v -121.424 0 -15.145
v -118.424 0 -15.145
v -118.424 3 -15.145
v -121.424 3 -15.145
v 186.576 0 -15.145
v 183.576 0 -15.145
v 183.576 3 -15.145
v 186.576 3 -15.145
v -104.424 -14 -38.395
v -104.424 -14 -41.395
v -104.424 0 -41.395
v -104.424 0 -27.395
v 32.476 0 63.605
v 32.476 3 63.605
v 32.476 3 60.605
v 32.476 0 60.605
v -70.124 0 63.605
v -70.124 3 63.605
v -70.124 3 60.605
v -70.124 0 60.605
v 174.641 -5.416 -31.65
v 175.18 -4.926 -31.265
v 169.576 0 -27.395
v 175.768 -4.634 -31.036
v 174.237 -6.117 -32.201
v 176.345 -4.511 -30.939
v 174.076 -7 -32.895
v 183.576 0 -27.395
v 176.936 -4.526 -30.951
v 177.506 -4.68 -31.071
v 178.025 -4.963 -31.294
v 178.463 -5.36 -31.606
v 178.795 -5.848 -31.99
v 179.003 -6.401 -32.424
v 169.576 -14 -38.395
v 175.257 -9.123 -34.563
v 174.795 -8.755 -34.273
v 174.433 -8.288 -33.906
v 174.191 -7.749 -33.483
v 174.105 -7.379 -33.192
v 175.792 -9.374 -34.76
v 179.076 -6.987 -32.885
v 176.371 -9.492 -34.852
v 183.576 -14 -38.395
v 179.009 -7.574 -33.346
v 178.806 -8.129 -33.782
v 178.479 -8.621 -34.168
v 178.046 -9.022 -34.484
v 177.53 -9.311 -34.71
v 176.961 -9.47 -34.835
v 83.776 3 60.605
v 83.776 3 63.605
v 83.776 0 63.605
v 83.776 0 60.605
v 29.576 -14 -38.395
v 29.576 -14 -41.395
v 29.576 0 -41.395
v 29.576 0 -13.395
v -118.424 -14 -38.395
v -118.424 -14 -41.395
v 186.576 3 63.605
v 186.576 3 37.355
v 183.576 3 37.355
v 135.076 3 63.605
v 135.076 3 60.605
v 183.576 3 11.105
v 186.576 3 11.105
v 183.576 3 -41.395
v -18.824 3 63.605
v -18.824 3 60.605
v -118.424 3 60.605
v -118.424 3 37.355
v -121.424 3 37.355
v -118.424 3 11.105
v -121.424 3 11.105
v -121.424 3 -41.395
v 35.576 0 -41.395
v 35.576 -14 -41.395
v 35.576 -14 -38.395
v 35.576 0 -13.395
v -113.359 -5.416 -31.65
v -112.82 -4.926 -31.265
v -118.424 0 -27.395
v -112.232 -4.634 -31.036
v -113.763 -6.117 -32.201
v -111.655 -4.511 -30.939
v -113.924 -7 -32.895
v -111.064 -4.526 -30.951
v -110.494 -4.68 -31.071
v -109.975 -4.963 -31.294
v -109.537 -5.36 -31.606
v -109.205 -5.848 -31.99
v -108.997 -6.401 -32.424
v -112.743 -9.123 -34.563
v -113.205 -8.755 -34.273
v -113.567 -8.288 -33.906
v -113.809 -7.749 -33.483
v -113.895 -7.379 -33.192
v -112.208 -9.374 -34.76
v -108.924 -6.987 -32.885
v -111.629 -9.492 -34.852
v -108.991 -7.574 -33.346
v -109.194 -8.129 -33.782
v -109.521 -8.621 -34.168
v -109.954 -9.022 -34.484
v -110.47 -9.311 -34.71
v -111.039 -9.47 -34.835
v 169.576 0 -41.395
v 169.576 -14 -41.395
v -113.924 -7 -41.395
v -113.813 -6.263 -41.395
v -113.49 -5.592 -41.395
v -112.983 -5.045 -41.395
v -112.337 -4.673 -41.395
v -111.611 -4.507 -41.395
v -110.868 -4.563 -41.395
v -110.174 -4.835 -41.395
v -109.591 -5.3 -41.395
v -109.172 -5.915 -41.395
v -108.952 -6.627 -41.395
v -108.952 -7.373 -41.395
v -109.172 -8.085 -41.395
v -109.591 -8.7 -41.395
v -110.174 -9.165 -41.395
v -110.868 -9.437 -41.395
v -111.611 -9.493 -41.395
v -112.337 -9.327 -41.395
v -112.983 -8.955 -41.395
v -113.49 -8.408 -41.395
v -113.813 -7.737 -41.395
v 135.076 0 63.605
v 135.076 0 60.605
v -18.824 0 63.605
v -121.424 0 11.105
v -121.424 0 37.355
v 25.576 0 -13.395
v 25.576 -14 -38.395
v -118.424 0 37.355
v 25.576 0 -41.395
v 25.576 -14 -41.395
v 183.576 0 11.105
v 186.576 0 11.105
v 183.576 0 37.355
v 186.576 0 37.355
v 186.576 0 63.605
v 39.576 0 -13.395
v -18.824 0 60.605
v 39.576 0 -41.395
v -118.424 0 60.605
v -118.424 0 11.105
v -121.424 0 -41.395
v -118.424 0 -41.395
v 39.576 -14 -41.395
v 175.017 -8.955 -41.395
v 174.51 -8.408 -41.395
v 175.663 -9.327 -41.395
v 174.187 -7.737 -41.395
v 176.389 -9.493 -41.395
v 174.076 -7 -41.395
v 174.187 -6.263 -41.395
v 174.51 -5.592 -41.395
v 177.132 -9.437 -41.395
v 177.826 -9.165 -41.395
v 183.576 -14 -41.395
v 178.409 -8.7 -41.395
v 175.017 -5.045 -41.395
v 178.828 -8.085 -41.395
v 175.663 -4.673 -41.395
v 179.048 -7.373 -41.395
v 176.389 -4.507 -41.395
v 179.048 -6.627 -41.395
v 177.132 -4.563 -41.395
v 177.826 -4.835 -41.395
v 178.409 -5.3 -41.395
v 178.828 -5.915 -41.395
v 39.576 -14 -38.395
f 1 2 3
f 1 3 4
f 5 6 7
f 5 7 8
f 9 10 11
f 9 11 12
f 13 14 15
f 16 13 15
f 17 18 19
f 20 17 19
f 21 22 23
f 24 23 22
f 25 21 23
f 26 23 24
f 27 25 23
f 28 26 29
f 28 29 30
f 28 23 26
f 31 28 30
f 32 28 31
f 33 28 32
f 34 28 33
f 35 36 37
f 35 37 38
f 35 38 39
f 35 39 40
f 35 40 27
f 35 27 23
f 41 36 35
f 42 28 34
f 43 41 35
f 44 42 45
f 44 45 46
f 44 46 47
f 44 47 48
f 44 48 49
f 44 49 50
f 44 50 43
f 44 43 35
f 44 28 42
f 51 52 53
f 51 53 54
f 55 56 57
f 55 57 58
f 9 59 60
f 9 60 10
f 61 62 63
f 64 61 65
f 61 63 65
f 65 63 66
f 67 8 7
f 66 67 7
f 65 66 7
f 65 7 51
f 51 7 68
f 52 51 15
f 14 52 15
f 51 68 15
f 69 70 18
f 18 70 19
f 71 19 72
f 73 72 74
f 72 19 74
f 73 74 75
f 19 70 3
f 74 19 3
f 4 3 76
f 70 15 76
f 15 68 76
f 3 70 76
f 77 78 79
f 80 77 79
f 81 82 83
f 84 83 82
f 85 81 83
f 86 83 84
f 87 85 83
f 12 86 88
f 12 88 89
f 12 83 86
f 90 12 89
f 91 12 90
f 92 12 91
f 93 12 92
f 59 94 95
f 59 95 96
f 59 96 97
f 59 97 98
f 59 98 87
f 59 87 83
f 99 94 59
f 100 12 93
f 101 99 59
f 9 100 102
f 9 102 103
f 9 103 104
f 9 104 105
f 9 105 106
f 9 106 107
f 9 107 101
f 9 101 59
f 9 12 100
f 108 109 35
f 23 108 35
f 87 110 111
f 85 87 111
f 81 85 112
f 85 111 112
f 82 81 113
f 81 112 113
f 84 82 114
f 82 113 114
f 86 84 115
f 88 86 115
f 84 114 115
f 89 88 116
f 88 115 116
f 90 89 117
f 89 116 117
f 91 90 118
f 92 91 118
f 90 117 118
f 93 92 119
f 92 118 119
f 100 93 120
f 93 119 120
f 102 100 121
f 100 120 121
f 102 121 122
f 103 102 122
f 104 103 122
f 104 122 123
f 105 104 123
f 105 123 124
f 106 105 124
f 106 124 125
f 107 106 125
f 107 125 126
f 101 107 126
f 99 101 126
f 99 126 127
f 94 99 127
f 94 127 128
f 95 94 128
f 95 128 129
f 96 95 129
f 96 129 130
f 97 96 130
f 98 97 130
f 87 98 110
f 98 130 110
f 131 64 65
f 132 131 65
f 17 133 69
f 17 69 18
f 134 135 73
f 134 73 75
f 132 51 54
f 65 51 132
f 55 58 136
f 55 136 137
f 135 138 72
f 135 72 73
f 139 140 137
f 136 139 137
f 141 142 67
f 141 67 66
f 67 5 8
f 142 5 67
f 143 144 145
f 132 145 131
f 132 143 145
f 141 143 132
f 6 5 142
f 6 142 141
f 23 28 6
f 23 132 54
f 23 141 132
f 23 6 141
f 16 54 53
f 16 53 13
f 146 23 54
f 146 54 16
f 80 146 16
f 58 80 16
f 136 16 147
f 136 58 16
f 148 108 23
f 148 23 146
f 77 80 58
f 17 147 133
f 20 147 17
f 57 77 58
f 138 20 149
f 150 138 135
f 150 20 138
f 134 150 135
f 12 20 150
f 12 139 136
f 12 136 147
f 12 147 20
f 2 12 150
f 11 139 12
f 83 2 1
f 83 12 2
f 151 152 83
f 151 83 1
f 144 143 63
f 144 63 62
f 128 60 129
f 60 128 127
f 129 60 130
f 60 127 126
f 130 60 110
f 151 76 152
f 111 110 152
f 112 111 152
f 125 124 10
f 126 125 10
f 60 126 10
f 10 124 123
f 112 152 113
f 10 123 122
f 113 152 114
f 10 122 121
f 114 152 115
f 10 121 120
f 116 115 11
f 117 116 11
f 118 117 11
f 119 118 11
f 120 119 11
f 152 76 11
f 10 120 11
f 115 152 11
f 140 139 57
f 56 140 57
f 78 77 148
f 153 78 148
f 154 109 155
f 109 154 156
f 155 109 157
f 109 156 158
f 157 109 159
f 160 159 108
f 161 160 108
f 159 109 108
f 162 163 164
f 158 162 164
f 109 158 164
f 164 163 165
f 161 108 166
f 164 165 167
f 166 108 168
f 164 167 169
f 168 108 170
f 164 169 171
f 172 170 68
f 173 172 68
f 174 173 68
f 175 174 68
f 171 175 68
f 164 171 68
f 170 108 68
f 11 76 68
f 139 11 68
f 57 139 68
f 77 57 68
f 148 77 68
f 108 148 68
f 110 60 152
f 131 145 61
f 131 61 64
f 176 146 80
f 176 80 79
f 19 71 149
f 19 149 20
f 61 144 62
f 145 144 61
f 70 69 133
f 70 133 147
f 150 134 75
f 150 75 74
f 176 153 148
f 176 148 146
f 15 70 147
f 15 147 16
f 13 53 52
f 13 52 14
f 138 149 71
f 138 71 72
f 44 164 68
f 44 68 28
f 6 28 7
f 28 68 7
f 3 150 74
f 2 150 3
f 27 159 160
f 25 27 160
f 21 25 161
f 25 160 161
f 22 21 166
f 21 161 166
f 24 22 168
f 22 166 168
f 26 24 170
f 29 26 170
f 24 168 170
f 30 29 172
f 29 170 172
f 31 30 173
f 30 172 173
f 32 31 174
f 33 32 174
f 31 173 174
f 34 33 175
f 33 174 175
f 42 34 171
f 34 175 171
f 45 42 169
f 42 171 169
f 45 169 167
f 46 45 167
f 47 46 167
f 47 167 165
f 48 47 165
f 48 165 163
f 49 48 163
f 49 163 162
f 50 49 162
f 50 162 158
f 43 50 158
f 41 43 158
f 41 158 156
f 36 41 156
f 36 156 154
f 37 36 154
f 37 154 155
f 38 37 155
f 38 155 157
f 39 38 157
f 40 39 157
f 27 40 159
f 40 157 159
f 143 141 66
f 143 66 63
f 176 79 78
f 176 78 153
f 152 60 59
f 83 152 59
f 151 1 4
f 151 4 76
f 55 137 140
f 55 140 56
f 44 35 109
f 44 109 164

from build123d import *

# Parameters (mm, degrees)
EXTRUDE_1_DEPTH     = 3
SKETCH_3_W          = 51.3
SKETCH_3_H          = 3
CUT_EXTRUDE_2_DEPTH = 3
SKETCH_4_W          = 4
SKETCH_4_H          = 28
SKETCH_4_W_2        = 14
SKETCH_4_H_2        = 14
EXTRUDE_2_DEPTH     = 14
CUT_EXTRUDE_3_DEPTH = 14
CUT_EXTRUDE_4_DEPTH = 14
CUT_EXTRUDE_5_DEPTH = 14
CUT_EXTRUDE_6_REACH = 216.55
SKETCH_9_R          = 2.5


with BuildPart() as part:
    # Эскиз1 → Бобышка-Вытянуть1 (new body)
    with BuildSketch(Plane(origin=(0, 0, 0), x_dir=(1, 0, 0), z_dir=(0, 1, 0))):
        Polygon((-121.424018304, 15.144551695), (-121.424018304, 41.394551695), (183.575981696, 41.394551695), (183.575981696, 15.144551695), (186.575981696, 15.144551695), (186.575981696, -11.105448305), (183.575981696, -11.105448305), (183.575981696, -37.355448305), (186.575981696, -37.355448305), (186.575981696, -63.605448305), (-118.424018304, -63.605448305), (-118.424018304, -37.355448305), (-121.424018304, -37.355448305), (-121.424018304, -11.105448305), (-118.424018304, -11.105448305), (-118.424018304, 15.144551695), align=None)
    extrude(amount=EXTRUDE_1_DEPTH)

    # Эскиз3 → Вырез-Вытянуть2 (cut)
    with BuildSketch(Plane(origin=(0, 3, 0), x_dir=(1, 0, 0), z_dir=(0, 1, 0))):
        with Locations((-95.774018304, -62.105448305)):
            Rectangle(SKETCH_3_W, SKETCH_3_H)
        with Locations((6.825981696, -62.105448305)):
            Rectangle(SKETCH_3_W, SKETCH_3_H)
        with Locations((109.425981696, -62.105448305)):
            Rectangle(SKETCH_3_W, SKETCH_3_H)
    extrude(amount=-CUT_EXTRUDE_2_DEPTH, mode=Mode.SUBTRACT)

    # Эскиз4 → Бобышка-Вытянуть2 (add)
    with BuildSketch(Plane.XZ):
        with Locations((27.575981696, -27.394551695)):
            Rectangle(SKETCH_4_W, SKETCH_4_H)
        with Locations((-111.424018304, -34.394551695)):
            Rectangle(SKETCH_4_W_2, SKETCH_4_H_2)
        with Locations((176.575981696, -34.394551695)):
            Rectangle(SKETCH_4_W_2, SKETCH_4_H_2)
        with Locations((37.575981696, -27.394551695)):
            Rectangle(SKETCH_4_W, SKETCH_4_H)
    extrude(amount=EXTRUDE_2_DEPTH)

    # Эскиз6 → Вырез-Вытянуть3 (cut)
    with BuildSketch(Plane(origin=(39.575981696, 0, 0), x_dir=(0, 0, -1), z_dir=(1, 0, 0))):
        Polygon((13.394551695, -14), (13.394551695, 0), (38.394551695, -14), align=None)
    extrude(amount=-CUT_EXTRUDE_3_DEPTH, mode=Mode.SUBTRACT)

    # Эскиз7 → Вырез-Вытянуть4 (cut)
    with BuildSketch(Plane(origin=(183.575981696, 0, 0), x_dir=(0, 0, -1), z_dir=(1, 0, 0))):
        Polygon((27.394551695, -14), (27.394551695, 0), (38.394551695, -14), align=None)
    extrude(amount=-CUT_EXTRUDE_4_DEPTH, mode=Mode.SUBTRACT)

    # Эскиз8 → Вырез-Вытянуть5 (cut)
    with BuildSketch(Plane(origin=(-104.424018304, 0, 0), x_dir=(0, 0, -1), z_dir=(1, 0, 0))):
        Polygon((27.394551695, -14), (27.394551695, 0), (38.394551695, -14), align=None)
    extrude(amount=-CUT_EXTRUDE_5_DEPTH, mode=Mode.SUBTRACT)

    # Вырез-Вытянуть6: up to this plane
    cut_extrude_6_end = Plane(origin=(169.575981696, -14, -38.394551695), z_dir=(0, 0.6178215519319037, -0.7863183388224225))
    # Эскиз9 → Вырез-Вытянуть6 (cut, up to the surface)
    with BuildSketch(Plane(origin=(0, 0, -41.394551695), x_dir=(-1, 0, 0), z_dir=(0, 0, -1)), mode=Mode.PRIVATE) as cut_extrude_6_sk1:
        with Locations((-176.575981696, -7)):
            Circle(SKETCH_9_R)
    cut_extrude_6_tool1 = split(extrude(cut_extrude_6_sk1.sketch, amount=-CUT_EXTRUDE_6_REACH, mode=Mode.PRIVATE), bisect_by=cut_extrude_6_end, keep=Keep.BOTH, mode=Mode.PRIVATE)
    add(cut_extrude_6_tool1.solids().sort_by_distance((176.575982, -7, -41.394552))[0], mode=Mode.SUBTRACT)
    # Эскиз9 → Вырез-Вытянуть6 (cut, up to the surface)
    with BuildSketch(Plane(origin=(0, 0, -41.394551695), x_dir=(-1, 0, 0), z_dir=(0, 0, -1)), mode=Mode.PRIVATE) as cut_extrude_6_sk2:
        with Locations((111.424018304, -7)):
            Circle(SKETCH_9_R)
    cut_extrude_6_tool2 = split(extrude(cut_extrude_6_sk2.sketch, amount=-CUT_EXTRUDE_6_REACH, mode=Mode.PRIVATE), bisect_by=cut_extrude_6_end, keep=Keep.BOTH, mode=Mode.PRIVATE)
    add(cut_extrude_6_tool2.solids().sort_by_distance((-111.424018, -7, -41.394552))[0], mode=Mode.SUBTRACT)


solid = part.part
